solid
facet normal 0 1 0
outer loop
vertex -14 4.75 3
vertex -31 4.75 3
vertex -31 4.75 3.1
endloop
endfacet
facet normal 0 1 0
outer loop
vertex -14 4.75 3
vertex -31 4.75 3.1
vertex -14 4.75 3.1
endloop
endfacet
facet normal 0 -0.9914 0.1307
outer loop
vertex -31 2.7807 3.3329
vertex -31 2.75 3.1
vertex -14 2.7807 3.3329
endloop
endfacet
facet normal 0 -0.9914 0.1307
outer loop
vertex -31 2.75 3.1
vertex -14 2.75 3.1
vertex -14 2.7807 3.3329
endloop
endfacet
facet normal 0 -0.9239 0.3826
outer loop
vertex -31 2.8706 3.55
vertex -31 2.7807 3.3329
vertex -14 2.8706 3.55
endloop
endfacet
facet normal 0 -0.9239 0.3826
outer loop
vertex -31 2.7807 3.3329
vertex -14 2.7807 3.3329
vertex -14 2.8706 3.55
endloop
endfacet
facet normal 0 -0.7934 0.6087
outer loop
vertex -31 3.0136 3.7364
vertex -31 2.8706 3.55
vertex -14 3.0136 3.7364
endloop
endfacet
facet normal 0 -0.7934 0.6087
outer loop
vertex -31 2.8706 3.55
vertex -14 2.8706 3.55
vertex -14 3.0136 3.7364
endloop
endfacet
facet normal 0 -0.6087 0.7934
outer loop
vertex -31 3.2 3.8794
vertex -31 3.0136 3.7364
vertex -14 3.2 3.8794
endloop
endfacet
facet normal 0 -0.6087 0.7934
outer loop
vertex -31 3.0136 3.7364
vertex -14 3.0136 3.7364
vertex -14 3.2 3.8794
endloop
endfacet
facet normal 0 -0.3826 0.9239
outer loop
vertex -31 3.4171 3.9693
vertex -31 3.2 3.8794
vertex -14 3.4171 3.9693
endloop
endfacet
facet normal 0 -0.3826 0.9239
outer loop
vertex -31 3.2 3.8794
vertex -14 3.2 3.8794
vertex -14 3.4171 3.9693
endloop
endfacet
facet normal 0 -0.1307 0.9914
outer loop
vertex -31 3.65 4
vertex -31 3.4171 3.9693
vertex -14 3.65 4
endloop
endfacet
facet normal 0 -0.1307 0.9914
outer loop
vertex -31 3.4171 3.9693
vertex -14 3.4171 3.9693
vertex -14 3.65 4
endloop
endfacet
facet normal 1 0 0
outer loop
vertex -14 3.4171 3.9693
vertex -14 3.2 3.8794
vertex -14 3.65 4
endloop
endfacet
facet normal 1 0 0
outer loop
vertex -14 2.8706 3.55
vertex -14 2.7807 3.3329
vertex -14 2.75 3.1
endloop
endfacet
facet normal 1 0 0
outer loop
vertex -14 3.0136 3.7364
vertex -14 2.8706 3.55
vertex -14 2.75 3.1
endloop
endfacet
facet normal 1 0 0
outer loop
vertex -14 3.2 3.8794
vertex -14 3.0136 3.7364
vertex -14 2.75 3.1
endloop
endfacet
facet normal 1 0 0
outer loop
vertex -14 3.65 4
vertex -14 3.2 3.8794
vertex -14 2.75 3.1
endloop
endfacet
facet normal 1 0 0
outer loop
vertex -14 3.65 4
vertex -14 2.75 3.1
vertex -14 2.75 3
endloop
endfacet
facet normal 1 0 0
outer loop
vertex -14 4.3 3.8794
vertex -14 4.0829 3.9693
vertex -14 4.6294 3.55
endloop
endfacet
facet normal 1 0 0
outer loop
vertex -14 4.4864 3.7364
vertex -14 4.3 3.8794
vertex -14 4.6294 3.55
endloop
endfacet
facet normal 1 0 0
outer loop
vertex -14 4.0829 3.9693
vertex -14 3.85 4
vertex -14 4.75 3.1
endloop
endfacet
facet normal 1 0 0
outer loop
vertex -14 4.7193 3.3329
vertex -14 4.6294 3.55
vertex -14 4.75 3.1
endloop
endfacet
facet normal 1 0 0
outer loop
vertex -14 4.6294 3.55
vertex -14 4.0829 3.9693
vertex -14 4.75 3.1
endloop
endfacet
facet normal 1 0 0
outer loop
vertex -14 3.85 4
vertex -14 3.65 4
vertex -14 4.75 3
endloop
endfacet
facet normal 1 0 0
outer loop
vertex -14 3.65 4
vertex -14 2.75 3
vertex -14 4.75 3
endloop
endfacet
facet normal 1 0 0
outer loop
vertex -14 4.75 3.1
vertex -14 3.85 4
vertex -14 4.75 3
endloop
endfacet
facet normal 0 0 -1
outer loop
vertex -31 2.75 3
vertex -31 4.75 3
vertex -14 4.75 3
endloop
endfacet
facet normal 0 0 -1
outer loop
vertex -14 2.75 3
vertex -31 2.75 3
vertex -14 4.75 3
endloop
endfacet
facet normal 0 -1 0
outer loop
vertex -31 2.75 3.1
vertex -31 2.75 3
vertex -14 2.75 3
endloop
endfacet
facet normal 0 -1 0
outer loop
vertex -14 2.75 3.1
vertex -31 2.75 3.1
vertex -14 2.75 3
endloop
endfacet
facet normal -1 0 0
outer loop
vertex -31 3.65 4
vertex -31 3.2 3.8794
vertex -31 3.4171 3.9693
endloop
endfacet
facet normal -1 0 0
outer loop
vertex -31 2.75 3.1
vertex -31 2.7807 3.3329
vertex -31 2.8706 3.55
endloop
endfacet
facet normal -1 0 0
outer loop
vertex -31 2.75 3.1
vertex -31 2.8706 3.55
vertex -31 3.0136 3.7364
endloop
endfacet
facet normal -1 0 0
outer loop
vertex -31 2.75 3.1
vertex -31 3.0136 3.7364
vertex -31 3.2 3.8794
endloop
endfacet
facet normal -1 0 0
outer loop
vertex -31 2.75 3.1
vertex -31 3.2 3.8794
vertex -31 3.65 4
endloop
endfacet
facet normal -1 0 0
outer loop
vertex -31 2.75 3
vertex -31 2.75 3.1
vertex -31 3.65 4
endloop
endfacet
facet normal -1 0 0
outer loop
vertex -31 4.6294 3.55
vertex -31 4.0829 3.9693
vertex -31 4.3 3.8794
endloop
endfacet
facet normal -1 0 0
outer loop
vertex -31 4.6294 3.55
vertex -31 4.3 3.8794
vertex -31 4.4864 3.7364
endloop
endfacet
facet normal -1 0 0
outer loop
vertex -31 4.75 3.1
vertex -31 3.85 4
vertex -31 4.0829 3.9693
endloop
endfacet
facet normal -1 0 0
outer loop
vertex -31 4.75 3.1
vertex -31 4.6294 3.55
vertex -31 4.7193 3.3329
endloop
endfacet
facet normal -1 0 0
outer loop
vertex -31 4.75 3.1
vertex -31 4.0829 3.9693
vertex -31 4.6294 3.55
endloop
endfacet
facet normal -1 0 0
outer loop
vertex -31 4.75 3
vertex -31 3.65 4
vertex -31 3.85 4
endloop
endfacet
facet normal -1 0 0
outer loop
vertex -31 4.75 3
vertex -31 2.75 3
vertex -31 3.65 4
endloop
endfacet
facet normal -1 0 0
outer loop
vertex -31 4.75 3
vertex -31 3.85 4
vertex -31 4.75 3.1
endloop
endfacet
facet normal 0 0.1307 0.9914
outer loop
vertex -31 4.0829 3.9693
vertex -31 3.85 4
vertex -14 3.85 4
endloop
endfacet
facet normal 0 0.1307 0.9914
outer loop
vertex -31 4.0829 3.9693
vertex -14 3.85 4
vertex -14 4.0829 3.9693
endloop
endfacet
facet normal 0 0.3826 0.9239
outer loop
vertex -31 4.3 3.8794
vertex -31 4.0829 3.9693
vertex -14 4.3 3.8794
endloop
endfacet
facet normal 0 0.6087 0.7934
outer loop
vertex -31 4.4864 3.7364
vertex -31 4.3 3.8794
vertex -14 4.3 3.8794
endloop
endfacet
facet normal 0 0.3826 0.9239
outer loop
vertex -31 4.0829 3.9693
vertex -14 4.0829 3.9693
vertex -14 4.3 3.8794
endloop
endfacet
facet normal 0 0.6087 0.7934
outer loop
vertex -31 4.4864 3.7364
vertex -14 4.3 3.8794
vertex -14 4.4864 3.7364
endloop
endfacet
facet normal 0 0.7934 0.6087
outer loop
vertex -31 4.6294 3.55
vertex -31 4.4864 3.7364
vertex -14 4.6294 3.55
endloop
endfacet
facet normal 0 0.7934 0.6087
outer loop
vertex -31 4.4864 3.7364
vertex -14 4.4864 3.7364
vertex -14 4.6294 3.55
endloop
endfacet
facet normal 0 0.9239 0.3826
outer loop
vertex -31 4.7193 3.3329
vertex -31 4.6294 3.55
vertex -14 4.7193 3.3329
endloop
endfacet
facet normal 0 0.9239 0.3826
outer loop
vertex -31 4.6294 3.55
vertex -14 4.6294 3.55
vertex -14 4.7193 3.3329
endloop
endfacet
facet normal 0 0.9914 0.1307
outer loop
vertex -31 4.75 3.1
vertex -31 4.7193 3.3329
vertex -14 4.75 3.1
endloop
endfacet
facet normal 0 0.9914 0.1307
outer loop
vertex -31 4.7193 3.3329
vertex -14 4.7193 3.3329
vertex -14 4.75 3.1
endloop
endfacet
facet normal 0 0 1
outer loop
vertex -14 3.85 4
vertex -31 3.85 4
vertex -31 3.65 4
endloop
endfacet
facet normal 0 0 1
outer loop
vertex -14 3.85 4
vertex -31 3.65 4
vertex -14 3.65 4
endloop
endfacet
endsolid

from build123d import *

# Parameters (mm, degrees)
BOX006_W     = 17
BOX006_H     = 2
BOX006_DEPTH = 1
FILLET008_R  = 0.9
FILLET009_R  = 0.9


with BuildPart() as part:
    # Box006 → Box006 (new body)
    with BuildSketch(Plane(origin=(-31, -4.75, 3), x_dir=(1, 0, 0), z_dir=(0, 0, 1))):
        with Locations((8.5, 1)):
            Rectangle(BOX006_W, BOX006_H)
    extrude(amount=BOX006_DEPTH)

    # Fillet008
    fillet008_edges = [part.edges().sort_by_distance(p)[0] for p in [
        (-22.5, -4.75, 4),
    ]]
    fillet(fillet008_edges, radius=FILLET008_R)

    # Fillet009
    fillet009_edges = [part.edges().sort_by_distance(p)[0] for p in [
        (-22.5, -2.75, 4),
    ]]
    fillet(fillet009_edges, radius=FILLET009_R)


with BuildPart() as part_1:
    # Fillet009 placement: moved
    add(part.part.moved(Location((0, 7.5, 0))))


solid = part_1.part
